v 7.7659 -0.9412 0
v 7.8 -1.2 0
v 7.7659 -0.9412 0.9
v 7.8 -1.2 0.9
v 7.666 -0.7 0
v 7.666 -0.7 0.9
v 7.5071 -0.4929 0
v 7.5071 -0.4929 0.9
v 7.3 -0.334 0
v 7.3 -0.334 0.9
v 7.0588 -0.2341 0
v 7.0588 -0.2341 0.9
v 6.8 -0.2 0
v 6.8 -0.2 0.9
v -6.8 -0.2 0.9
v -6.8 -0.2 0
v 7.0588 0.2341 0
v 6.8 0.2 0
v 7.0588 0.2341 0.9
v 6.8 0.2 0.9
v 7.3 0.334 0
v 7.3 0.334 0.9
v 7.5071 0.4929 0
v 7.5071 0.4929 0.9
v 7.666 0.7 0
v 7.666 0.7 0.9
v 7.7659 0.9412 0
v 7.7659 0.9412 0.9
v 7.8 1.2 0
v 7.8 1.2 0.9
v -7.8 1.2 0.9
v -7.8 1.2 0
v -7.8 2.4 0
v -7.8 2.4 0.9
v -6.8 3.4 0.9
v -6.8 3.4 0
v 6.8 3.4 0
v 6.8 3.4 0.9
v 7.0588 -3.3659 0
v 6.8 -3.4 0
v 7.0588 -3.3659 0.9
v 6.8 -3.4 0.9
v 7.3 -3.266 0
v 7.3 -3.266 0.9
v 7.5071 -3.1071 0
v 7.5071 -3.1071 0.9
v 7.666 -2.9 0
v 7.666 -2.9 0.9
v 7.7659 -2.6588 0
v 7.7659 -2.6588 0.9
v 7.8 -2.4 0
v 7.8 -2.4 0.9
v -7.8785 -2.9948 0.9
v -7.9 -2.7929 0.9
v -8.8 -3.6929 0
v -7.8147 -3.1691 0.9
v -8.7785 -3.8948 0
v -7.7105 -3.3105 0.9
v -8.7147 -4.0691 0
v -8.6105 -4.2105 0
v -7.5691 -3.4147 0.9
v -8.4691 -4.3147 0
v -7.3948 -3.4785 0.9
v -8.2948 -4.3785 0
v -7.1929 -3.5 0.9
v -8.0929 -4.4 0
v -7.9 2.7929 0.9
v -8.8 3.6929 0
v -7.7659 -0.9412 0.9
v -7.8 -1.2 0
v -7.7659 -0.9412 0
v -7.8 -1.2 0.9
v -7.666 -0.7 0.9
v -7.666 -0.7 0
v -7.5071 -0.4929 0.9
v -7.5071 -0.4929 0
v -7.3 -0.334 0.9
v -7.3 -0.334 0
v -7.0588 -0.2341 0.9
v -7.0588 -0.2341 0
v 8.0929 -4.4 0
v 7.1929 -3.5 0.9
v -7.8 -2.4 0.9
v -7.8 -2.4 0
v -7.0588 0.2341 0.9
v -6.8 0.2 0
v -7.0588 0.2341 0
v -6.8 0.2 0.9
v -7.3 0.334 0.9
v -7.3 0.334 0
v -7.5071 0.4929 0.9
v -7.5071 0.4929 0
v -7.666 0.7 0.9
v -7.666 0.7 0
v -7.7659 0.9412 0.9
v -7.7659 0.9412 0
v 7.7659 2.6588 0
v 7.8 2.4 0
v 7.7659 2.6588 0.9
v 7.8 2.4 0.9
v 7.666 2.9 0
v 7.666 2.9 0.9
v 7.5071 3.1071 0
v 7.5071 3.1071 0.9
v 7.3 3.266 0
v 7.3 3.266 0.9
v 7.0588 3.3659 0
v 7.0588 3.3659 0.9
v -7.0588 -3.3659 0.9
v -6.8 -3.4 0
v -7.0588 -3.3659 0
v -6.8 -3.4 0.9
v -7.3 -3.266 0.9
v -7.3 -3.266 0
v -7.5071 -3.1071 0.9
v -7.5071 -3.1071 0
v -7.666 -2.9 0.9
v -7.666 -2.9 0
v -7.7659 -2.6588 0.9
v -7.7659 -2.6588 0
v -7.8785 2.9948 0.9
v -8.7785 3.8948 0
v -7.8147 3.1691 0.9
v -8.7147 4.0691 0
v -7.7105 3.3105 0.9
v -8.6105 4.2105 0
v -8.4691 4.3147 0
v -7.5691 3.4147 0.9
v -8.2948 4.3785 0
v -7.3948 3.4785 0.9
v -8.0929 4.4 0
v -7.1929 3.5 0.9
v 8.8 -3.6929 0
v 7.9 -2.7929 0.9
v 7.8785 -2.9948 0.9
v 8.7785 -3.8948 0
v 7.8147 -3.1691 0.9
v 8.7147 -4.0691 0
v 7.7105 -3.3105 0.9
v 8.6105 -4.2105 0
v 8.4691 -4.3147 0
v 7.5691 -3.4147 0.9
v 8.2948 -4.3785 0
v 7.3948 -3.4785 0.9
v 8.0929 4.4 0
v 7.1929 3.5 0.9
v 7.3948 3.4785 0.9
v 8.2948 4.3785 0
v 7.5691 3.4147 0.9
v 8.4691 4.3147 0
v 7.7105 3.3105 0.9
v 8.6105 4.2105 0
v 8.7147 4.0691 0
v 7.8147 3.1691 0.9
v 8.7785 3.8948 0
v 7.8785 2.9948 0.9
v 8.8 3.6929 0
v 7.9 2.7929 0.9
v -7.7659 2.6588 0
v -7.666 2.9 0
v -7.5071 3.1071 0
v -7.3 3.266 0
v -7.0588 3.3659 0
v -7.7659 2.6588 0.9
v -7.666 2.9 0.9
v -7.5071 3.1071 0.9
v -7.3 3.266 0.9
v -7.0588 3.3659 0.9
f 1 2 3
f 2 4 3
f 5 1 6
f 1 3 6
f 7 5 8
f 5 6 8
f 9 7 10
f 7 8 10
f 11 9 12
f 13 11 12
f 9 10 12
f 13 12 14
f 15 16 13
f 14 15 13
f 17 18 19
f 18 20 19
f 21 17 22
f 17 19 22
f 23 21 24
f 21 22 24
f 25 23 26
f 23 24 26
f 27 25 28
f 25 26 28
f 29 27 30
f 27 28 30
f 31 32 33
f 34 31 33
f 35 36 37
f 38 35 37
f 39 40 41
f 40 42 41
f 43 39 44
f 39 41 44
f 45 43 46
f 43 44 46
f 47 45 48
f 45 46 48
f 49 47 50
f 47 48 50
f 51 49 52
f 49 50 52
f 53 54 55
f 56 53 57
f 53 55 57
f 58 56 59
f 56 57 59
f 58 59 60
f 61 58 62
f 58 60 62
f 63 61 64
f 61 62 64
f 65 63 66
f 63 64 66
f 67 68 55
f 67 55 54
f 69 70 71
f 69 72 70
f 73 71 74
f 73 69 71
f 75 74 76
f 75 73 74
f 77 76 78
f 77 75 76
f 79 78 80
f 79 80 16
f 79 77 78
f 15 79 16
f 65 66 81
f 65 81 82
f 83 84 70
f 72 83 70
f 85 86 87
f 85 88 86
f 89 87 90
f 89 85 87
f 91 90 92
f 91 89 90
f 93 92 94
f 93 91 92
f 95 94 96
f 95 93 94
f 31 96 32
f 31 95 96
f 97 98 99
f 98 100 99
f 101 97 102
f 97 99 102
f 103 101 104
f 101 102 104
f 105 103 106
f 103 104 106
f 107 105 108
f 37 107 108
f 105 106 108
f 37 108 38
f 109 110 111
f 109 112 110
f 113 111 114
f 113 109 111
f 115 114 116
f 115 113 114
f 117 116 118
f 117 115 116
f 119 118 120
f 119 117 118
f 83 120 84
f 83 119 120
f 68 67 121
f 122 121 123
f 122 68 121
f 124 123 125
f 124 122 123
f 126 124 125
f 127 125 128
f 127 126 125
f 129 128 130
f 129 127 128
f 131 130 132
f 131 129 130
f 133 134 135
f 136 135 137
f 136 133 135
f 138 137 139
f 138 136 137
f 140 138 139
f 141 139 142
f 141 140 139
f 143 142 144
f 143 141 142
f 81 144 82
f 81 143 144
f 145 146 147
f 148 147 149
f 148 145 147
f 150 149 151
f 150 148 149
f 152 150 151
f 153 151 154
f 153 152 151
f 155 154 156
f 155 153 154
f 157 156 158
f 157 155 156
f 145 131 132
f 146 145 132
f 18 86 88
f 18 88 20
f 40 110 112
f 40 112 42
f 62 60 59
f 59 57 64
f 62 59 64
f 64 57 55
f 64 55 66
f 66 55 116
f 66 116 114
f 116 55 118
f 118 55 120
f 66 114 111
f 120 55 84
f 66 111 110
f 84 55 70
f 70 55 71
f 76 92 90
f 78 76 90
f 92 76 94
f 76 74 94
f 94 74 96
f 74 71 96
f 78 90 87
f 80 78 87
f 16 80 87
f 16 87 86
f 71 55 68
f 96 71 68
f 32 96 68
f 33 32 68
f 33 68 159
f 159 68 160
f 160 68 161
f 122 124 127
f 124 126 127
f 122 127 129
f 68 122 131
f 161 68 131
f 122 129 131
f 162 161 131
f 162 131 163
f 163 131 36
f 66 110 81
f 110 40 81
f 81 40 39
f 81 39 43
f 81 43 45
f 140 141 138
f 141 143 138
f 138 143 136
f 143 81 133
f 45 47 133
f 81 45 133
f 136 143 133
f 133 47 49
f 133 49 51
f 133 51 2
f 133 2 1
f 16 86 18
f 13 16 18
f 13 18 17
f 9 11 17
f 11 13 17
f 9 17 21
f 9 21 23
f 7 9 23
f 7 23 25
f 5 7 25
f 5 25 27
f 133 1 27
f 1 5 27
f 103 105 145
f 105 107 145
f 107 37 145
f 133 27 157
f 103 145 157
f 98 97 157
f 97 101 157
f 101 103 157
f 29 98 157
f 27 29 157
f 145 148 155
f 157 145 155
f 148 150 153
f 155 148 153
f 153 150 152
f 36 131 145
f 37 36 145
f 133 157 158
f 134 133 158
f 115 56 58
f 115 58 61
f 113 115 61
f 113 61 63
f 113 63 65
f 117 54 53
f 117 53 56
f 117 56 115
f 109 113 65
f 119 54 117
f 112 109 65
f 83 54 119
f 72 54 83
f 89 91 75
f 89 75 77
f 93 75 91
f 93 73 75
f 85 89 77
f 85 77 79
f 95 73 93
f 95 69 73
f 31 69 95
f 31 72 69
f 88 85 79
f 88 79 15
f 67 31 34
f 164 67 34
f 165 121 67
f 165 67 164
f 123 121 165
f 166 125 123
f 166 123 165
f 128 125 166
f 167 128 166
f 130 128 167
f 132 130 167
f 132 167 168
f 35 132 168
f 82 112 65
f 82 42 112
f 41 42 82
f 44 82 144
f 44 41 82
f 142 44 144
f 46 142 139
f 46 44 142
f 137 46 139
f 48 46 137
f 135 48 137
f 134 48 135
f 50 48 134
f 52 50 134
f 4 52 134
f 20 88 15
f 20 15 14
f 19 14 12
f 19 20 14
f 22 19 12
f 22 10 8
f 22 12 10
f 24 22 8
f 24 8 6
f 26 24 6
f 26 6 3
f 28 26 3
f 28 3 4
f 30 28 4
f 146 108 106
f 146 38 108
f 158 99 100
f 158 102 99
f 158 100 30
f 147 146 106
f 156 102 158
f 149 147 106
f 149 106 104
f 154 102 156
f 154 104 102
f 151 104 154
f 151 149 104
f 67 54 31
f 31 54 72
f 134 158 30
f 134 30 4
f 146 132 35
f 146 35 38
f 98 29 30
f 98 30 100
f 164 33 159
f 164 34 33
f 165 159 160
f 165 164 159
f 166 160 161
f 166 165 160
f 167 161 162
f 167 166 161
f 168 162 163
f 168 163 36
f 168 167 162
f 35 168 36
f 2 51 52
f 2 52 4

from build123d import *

# Parameters (mm, degrees)
F0_W        = 18
F0_H        = 9.2
F0_W_2      = 15.6
F0_H_2      = 3.2
F1_DEPTH    = 0.9
F2_T1_DEPTH = 23.6577025735
F2_T3_DEPTH = 14.8577025735
F3_R        = 1


# Not quite as in the source:
# - a fillet or chamfer that OpenCascade refuses, or shapes differently, is made with other operations: its cross-section is extruded or revolved along the edge and cut away or added


with BuildPart() as f1:
    # F0 (on Top) → F1 (new body)
    with BuildSketch(Plane.XY):
        Rectangle(F0_W, F0_H)
        with Locations((0, -1.8)):
            Rectangle(F0_W_2, F0_H_2, mode=Mode.SUBTRACT)
        with Locations((0, 1.8)):
            Rectangle(F0_W_2, F0_H_2, mode=Mode.SUBTRACT)
    extrude(amount=F1_DEPTH)

    # F2: chamfer of 1.1 on 4 edges, made by hand

    # F2_s2 → F2_t1 (cut)
    with BuildSketch(Plane.YZ.offset(-11.8288512868)):
        Polygon((-4.6, -0.2), (-3.5, 0.9), (-4.6, 0.9), align=None)
        Polygon((4.6, -0.2), (3.5, 0.9), (4.6, 0.9), align=None)
    extrude(amount=F2_T1_DEPTH, mode=Mode.SUBTRACT)

    # F2_s4 → F2_t3 (cut)
    with BuildSketch(Plane.XZ.offset(-7.4288512868)):
        Polygon((-9, -0.2), (-7.9, 0.9), (-9, 0.9), align=None)
        Polygon((9, -0.2), (7.9, 0.9), (9, 0.9), align=None)
    extrude(amount=F2_T3_DEPTH, mode=Mode.SUBTRACT)

    # F3
    f3_edges = [f1.edges().sort_by_distance(p)[0] for p in [
        (-7.8, 3.4, 0.45),
        (-7.8, -0.2, 0.45),
        (7.8, 0.2, 0.45),
        (7.8, -3.4, 0.45),
        (7.8, 3.4, 0.45),
        (7.8, -0.2, 0.45),
        (-7.8, 0.2, 0.45),
        (-7.8, -3.4, 0.45),
        (-8.35, -3.95, 0.45),
        (8.35, -3.95, 0.45),
        (8.35, 3.95, 0.45),
        (-8.35, 3.95, 0.45),
    ]]
    fillet(f3_edges, radius=F3_R)


solid = f1.part
